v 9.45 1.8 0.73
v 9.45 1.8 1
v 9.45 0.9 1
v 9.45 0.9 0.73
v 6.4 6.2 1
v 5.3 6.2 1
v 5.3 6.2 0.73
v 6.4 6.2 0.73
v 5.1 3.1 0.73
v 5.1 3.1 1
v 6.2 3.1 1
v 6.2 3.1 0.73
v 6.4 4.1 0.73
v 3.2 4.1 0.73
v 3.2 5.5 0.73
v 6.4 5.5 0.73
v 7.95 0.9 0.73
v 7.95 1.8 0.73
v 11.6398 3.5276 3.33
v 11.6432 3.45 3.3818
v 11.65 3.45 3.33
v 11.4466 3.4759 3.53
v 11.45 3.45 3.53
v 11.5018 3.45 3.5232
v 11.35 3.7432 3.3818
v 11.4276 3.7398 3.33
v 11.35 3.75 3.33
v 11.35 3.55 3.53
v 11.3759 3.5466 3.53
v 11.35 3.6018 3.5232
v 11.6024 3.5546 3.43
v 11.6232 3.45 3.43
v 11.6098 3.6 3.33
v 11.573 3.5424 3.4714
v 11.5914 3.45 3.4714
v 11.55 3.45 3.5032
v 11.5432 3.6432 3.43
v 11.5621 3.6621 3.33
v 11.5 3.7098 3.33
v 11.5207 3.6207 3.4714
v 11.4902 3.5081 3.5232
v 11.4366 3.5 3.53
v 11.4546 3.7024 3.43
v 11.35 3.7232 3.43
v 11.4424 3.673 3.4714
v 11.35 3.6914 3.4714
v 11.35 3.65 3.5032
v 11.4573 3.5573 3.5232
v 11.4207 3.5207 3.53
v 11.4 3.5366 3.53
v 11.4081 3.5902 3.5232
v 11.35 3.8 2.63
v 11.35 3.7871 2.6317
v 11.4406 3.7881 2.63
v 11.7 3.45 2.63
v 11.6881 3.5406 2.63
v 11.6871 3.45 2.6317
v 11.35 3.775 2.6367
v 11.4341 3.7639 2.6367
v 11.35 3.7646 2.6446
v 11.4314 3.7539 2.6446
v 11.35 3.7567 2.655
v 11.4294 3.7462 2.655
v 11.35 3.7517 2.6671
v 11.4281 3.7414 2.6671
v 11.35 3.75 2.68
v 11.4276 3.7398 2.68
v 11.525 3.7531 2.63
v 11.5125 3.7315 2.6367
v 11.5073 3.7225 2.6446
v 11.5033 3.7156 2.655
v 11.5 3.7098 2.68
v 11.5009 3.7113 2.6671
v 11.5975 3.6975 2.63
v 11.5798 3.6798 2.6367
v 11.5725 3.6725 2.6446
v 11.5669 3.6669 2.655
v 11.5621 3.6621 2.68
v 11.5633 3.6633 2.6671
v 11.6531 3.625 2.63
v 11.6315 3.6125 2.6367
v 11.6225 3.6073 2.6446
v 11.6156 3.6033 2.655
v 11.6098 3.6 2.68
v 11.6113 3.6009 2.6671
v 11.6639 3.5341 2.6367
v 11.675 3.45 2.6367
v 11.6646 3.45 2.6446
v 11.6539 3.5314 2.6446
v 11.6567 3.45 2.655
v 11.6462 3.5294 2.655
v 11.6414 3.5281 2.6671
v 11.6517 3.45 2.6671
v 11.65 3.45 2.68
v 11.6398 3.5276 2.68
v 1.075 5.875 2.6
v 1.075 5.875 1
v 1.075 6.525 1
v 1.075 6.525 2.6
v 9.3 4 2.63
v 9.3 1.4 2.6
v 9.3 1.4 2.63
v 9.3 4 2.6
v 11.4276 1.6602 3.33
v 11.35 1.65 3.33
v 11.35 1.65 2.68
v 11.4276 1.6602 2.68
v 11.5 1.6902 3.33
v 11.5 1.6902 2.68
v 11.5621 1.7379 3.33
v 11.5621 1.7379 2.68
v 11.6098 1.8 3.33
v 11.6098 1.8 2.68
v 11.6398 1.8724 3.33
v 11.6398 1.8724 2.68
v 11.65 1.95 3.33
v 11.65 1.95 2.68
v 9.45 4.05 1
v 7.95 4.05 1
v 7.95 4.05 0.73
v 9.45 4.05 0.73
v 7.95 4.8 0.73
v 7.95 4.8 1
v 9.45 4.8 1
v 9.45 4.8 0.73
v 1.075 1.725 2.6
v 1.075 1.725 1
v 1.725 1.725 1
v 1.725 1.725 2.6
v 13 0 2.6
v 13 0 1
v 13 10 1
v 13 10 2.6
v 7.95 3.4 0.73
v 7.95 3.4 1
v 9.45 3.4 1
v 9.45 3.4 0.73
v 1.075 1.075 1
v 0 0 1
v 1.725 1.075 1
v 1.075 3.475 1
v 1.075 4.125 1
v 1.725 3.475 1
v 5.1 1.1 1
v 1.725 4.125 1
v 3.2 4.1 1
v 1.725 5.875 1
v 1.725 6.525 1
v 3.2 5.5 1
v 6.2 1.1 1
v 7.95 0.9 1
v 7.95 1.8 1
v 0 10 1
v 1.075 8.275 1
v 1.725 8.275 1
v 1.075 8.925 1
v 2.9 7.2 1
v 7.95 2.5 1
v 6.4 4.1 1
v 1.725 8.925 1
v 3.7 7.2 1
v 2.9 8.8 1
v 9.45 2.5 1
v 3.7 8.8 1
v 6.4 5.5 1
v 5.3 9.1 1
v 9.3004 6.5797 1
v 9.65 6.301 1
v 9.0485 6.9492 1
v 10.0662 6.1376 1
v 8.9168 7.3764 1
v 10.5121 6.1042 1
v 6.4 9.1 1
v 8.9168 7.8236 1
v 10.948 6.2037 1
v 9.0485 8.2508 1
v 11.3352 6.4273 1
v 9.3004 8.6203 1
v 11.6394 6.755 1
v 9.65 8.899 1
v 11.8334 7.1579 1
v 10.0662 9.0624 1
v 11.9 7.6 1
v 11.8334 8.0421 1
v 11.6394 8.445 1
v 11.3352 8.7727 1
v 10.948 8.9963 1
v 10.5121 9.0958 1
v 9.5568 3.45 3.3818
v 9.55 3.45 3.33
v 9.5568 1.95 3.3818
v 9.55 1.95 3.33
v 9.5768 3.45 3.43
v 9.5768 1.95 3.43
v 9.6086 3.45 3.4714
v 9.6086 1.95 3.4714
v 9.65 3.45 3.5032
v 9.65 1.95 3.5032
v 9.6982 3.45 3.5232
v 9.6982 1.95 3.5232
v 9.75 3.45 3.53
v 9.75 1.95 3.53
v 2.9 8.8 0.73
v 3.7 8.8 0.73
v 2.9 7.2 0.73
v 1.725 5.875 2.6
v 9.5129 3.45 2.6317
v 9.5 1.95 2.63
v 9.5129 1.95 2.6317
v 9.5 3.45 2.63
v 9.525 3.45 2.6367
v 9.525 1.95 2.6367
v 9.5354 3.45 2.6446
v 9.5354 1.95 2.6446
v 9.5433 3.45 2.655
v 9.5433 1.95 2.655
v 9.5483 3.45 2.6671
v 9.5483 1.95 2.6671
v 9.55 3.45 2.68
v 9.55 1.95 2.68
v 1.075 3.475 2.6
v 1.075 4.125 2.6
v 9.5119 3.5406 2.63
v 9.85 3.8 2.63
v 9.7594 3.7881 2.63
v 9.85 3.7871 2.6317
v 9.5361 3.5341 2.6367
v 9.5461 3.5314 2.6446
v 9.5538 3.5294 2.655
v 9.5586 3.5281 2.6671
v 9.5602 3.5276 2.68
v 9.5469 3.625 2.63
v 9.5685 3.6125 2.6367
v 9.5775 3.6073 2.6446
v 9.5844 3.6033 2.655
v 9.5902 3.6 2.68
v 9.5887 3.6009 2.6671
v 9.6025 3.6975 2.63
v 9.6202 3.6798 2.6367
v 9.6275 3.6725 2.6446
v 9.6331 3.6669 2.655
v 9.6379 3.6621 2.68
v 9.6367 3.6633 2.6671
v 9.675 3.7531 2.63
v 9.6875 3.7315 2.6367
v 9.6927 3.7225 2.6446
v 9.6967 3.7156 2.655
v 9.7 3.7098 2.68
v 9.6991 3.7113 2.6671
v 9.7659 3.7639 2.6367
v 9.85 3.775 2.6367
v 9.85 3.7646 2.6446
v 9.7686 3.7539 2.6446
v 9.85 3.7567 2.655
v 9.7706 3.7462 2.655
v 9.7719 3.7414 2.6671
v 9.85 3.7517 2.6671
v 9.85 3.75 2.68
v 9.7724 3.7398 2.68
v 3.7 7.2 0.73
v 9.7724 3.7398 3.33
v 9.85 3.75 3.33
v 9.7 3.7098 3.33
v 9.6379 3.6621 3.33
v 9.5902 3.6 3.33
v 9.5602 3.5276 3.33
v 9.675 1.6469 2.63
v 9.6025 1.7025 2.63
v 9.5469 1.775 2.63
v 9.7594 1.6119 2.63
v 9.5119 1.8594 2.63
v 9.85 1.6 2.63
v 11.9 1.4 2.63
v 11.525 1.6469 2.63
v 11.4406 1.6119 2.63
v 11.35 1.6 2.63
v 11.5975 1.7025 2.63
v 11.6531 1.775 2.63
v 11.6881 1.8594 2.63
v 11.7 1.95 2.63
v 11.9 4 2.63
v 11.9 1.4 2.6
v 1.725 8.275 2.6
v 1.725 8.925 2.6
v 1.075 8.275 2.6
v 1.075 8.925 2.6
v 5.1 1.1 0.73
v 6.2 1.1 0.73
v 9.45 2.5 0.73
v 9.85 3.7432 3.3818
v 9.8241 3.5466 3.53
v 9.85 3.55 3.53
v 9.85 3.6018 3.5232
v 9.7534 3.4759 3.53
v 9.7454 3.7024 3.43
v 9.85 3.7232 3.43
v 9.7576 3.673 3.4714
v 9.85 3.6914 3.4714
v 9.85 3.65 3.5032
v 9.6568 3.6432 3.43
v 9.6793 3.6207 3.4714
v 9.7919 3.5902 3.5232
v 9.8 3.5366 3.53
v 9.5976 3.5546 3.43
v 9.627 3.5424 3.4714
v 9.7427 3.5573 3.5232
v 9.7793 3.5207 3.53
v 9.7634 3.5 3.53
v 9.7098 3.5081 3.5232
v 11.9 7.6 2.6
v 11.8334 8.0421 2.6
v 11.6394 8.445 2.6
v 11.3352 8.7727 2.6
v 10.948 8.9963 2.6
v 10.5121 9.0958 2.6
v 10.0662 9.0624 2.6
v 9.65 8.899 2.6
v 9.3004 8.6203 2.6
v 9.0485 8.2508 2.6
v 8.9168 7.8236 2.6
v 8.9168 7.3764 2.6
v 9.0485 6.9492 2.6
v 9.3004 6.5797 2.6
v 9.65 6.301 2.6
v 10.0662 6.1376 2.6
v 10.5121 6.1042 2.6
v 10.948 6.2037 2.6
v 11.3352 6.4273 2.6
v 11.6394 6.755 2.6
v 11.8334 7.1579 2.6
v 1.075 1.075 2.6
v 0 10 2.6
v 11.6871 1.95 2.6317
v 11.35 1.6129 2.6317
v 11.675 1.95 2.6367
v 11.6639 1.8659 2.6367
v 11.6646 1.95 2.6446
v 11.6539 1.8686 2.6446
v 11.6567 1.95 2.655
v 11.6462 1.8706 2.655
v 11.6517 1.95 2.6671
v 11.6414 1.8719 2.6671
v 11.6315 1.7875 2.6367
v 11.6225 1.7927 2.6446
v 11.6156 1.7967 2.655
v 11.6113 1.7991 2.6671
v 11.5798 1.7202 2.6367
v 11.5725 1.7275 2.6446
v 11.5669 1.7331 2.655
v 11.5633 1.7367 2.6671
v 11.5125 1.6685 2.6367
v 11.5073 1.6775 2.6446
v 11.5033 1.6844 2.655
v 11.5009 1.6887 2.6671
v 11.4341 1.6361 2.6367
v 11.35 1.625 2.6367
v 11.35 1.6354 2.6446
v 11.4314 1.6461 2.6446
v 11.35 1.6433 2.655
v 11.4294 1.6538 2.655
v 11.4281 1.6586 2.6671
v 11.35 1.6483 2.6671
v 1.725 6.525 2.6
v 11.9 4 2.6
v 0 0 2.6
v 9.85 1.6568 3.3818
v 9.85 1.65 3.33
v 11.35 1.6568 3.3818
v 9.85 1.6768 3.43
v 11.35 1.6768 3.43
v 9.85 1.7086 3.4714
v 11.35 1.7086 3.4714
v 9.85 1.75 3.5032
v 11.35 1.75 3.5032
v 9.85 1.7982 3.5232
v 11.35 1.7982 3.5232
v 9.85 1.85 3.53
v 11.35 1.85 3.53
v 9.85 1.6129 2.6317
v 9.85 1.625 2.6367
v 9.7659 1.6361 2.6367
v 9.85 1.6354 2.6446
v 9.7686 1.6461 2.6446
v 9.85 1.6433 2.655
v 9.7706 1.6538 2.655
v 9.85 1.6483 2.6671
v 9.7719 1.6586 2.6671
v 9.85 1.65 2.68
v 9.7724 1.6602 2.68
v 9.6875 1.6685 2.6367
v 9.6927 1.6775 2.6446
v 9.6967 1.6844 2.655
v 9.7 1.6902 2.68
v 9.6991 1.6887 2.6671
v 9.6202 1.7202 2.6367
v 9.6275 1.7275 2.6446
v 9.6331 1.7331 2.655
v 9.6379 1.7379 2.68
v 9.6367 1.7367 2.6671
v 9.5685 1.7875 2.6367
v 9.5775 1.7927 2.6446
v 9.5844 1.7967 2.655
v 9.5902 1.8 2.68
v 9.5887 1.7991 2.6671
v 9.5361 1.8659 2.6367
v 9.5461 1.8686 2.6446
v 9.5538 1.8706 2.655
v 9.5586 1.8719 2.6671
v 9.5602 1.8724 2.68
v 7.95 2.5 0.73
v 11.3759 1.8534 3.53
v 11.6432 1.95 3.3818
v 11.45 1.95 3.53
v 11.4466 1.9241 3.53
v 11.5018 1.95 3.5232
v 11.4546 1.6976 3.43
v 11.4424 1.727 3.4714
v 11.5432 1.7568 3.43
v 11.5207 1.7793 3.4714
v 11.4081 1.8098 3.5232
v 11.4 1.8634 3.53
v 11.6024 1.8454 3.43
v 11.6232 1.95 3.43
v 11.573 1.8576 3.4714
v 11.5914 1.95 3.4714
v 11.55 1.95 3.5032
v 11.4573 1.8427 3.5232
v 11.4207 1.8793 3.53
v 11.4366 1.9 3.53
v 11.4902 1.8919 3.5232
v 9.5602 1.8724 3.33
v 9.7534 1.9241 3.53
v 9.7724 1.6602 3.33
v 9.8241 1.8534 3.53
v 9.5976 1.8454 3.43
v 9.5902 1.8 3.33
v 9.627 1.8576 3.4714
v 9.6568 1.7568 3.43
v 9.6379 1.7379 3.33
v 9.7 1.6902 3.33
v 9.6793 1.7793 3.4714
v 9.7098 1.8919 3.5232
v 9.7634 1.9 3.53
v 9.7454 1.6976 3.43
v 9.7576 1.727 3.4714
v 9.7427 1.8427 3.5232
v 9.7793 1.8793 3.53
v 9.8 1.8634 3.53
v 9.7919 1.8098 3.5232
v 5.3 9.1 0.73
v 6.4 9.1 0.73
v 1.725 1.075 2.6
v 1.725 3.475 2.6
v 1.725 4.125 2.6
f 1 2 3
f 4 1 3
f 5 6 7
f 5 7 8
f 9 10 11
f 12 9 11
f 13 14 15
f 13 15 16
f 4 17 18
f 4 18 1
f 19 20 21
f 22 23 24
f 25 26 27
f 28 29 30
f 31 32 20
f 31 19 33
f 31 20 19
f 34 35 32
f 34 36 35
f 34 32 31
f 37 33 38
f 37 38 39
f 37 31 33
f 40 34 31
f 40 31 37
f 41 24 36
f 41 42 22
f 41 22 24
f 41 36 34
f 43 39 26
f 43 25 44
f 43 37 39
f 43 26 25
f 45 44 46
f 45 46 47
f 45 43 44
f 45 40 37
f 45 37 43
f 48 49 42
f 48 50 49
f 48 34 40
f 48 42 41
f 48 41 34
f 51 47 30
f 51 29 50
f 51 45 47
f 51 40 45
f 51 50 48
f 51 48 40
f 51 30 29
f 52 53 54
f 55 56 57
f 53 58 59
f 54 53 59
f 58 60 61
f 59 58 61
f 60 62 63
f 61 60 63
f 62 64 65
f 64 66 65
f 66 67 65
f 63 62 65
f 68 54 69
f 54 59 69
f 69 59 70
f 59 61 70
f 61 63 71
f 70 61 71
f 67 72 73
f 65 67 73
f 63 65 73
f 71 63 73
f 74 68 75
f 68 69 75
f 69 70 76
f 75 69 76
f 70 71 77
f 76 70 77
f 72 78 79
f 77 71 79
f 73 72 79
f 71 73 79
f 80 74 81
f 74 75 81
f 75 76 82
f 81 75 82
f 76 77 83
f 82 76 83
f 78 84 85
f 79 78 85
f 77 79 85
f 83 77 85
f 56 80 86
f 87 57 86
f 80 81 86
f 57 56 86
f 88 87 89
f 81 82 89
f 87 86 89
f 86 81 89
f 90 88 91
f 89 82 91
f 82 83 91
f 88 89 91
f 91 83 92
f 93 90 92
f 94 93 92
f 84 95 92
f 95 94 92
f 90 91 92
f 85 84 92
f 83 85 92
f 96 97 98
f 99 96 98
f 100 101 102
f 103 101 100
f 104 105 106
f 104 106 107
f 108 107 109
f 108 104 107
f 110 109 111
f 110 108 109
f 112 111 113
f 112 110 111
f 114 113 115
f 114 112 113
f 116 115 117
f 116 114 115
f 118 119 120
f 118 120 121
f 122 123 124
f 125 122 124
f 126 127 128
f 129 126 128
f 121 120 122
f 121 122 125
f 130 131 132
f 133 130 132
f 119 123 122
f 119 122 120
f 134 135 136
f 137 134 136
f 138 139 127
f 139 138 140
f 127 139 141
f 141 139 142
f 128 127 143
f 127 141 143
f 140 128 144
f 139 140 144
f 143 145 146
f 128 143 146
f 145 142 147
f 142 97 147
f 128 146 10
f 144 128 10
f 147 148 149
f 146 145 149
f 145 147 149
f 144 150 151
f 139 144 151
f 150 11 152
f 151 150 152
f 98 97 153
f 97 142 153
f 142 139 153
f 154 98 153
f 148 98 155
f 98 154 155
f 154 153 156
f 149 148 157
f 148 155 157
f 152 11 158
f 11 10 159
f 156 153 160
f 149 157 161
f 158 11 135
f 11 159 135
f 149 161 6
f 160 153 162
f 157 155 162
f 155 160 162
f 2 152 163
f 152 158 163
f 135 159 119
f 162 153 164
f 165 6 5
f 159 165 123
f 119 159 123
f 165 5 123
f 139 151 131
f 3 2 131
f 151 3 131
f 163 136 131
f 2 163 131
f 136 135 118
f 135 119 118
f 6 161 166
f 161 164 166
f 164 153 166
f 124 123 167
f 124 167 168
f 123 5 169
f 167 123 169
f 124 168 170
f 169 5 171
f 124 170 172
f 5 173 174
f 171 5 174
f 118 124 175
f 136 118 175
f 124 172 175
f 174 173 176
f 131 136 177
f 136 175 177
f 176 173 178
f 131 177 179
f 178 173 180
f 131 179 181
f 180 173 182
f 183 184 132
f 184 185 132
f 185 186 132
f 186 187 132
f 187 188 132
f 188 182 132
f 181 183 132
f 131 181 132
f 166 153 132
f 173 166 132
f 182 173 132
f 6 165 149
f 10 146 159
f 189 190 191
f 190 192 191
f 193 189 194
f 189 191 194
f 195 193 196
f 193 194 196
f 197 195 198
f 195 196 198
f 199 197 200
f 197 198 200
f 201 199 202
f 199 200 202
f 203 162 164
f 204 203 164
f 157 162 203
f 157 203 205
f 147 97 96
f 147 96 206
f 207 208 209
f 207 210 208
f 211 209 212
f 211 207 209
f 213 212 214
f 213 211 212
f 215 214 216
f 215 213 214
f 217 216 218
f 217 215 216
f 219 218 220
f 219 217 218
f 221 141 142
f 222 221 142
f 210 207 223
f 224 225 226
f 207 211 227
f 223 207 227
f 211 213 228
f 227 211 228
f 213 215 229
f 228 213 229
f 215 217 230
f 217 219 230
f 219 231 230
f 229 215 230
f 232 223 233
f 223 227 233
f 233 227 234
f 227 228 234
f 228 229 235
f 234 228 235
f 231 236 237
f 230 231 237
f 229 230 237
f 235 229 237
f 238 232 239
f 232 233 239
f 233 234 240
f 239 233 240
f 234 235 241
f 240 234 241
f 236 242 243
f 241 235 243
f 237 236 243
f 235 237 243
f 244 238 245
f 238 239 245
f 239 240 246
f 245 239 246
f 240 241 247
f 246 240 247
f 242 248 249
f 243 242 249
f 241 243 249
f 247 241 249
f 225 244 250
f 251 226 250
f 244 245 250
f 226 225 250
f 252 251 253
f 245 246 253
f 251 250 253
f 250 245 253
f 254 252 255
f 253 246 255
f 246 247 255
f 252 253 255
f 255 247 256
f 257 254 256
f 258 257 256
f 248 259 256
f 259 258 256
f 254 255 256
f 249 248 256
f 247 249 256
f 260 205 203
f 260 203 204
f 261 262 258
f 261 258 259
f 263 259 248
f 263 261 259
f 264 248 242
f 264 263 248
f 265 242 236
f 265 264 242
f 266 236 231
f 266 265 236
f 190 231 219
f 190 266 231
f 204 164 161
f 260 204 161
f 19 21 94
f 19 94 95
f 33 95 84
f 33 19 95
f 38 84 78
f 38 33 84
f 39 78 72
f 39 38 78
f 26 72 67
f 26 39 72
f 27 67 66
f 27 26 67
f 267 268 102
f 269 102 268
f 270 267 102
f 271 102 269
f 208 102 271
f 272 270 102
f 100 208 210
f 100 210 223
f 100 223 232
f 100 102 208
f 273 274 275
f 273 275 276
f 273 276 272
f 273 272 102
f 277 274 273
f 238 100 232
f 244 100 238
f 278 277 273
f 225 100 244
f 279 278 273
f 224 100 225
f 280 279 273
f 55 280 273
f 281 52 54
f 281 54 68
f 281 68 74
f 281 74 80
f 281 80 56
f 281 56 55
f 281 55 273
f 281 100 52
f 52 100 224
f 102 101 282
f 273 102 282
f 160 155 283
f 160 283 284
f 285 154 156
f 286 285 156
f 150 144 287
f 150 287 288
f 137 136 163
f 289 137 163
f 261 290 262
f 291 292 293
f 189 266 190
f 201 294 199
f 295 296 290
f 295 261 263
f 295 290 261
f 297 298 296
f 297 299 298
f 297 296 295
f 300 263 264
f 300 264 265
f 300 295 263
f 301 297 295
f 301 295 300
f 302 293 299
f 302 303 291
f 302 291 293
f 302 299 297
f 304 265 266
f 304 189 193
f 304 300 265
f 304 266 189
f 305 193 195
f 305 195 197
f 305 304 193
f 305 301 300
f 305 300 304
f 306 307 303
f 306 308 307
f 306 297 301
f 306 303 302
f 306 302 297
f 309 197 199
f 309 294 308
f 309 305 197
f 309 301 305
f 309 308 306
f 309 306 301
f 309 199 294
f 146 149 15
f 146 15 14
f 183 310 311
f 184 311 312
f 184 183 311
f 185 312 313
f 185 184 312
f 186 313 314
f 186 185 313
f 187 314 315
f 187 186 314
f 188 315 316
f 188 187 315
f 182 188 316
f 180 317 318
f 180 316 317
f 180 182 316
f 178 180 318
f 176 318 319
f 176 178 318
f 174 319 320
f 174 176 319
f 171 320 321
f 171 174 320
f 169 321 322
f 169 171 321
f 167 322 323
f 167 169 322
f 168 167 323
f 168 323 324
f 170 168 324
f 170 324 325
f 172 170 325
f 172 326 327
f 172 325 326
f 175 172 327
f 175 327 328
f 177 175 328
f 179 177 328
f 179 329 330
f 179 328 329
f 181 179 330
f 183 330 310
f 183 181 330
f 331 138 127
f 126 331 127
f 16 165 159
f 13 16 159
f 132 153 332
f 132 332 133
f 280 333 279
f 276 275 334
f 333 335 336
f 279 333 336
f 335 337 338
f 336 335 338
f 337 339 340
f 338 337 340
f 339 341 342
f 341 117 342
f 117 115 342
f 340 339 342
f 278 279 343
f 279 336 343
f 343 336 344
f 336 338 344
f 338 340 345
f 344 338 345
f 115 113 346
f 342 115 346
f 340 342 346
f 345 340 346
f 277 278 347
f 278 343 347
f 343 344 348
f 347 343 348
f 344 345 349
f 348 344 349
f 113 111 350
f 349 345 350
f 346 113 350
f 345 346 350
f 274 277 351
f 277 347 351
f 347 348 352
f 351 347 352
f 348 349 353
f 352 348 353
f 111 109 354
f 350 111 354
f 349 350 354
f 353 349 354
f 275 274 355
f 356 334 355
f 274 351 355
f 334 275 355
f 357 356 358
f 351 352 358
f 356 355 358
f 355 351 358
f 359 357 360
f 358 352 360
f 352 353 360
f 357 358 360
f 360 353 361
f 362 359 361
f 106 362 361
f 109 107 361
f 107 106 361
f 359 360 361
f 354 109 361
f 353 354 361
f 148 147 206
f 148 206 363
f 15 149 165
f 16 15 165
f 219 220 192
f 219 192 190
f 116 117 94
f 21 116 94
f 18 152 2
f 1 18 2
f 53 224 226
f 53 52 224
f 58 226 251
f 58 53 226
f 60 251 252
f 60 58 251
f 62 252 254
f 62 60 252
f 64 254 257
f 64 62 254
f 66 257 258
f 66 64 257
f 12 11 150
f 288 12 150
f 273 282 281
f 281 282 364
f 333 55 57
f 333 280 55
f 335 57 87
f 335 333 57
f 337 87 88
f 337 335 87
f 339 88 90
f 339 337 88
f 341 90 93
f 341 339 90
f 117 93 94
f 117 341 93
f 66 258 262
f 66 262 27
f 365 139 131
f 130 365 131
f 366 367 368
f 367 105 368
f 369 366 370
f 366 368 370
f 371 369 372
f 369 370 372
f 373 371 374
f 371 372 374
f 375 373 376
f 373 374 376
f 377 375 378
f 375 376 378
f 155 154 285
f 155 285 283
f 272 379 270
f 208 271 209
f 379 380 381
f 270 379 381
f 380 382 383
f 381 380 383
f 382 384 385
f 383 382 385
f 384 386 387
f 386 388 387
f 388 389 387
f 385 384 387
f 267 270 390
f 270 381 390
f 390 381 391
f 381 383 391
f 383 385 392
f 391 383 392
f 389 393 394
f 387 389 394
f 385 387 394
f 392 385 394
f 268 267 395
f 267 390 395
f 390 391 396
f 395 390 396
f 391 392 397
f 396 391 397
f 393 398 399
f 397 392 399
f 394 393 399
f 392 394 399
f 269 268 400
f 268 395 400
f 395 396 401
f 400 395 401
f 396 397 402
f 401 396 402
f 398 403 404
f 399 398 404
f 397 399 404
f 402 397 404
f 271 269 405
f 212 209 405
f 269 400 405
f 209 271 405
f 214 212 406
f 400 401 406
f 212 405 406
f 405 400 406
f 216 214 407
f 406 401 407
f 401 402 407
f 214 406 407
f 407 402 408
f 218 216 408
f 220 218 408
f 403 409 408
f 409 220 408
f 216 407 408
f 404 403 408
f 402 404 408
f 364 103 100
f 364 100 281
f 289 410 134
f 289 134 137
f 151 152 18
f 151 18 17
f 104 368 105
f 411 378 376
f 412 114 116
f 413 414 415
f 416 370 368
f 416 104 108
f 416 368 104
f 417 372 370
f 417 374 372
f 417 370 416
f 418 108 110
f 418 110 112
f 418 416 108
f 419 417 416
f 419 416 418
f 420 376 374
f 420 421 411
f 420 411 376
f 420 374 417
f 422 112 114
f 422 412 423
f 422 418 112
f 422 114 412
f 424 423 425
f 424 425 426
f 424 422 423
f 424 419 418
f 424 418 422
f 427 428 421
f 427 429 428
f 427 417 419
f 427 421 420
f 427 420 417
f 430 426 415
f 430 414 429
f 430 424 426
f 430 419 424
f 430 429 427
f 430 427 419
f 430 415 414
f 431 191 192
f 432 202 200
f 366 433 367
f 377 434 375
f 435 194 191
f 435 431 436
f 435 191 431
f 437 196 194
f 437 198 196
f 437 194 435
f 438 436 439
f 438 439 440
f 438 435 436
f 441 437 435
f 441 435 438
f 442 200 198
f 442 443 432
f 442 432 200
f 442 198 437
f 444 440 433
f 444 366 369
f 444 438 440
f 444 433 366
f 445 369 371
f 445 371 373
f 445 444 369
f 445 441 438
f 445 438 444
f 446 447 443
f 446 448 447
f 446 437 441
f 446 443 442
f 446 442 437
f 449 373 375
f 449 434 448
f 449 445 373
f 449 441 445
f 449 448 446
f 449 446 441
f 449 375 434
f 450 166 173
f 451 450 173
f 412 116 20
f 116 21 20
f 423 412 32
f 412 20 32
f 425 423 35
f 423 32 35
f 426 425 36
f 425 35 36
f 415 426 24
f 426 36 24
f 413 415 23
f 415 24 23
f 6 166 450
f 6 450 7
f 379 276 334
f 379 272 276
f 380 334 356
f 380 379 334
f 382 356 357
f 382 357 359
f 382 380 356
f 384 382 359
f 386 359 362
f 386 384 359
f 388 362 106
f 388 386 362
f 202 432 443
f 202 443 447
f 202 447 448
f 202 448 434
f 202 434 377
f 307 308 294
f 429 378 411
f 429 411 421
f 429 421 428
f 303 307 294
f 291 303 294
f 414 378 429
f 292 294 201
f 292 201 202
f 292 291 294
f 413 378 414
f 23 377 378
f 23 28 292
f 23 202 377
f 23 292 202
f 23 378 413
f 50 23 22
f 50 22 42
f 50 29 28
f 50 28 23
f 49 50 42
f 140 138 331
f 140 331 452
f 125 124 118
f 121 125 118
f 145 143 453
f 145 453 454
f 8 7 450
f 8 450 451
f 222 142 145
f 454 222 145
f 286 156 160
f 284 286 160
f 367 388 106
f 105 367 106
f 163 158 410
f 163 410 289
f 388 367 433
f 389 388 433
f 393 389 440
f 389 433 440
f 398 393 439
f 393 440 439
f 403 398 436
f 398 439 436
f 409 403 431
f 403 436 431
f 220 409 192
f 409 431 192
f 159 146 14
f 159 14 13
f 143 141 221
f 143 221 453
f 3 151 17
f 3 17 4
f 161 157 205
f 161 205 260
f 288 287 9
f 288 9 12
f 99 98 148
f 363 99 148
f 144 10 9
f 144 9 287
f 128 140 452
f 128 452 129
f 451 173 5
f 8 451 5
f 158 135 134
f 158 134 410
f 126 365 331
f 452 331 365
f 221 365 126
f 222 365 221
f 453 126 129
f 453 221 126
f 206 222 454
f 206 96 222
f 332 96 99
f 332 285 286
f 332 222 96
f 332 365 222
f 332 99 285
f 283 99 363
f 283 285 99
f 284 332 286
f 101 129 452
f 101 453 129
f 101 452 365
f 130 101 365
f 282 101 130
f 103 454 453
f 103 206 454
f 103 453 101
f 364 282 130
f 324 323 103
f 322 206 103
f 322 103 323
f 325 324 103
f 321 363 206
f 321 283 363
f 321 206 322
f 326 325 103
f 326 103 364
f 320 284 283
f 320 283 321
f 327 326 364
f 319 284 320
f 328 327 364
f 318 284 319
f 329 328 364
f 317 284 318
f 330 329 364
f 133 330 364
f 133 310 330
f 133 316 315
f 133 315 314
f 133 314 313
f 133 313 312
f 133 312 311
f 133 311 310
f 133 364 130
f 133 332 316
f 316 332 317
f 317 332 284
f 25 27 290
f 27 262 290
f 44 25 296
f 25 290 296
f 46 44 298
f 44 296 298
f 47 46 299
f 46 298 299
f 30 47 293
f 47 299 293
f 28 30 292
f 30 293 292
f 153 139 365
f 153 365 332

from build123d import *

# Parameters (mm, degrees)
SKETCH_W      = 13
SKETCH_H      = 10
PAD_DEPTH     = 1.6
SKETCH001_R   = 1.5
SKETCH001_W   = 0.65
SKETCH001_H   = 0.65
POCKET_DEPTH  = 5
SKETCH002_W   = 2.6
SKETCH002_H   = 2.6
PAD001_DEPTH  = 0.03
SKETCH003_W   = 2.1
SKETCH003_H   = 2.1
PAD002_DEPTH  = 0.9
FILLET_R      = 0.3
FILLET001_R   = 0.05
FILLET002_R   = 0.2
SKETCH004_W   = 1.1
SKETCH004_H   = 2
SKETCH004_W_2 = 1.5
SKETCH004_H_2 = 0.9
SKETCH004_H_3 = 0.75
SKETCH004_H_4 = 2.9
SKETCH004_W_3 = 3.2
SKETCH004_H_5 = 1.4
SKETCH004_W_4 = 0.8
SKETCH004_H_6 = 1.6
PAD003_DEPTH  = 0.27


with BuildPart() as part:
    # Sketch → Pad (new body)
    with BuildSketch(Plane.XY):
        with Locations((6.5, 5)):
            Rectangle(SKETCH_W, SKETCH_H)
    extrude(amount=PAD_DEPTH)

    # Sketch001 → Pocket (cut)
    with BuildSketch(Plane.XY):
        with Locations((10.4, 7.6)):
            Circle(SKETCH001_R)
        with Locations((1.4, 8.6)):
            Rectangle(SKETCH001_W, SKETCH001_H)
        with Locations((1.4, 6.2)):
            Rectangle(SKETCH001_W, SKETCH001_H)
        with Locations((1.4, 3.8)):
            Rectangle(SKETCH001_W, SKETCH001_H)
        with Locations((1.4, 1.4)):
            Rectangle(SKETCH001_W, SKETCH001_H)
    extrude(amount=POCKET_DEPTH, mode=Mode.SUBTRACT)

    # Sketch002 (on Face5 of Pocket) → Pad001 (join)
    with BuildSketch(Plane.XY.offset(1.6)):
        with Locations((10.6, 2.7)):
            Rectangle(SKETCH002_W, SKETCH002_H)
    extrude(amount=PAD001_DEPTH)

    # Sketch003 (on Face28 of Pad001) → Pad002 (join)
    with BuildSketch(Plane.XY.offset(1.63)):
        with Locations((10.6, 2.7)):
            Rectangle(SKETCH003_W, SKETCH003_H)
    extrude(amount=PAD002_DEPTH)

    # Fillet
    fillet_edges = [part.edges().sort_by_distance(p)[0] for p in [
        (9.55, 1.65, 2.08),
        (9.55, 3.75, 2.08),
        (11.65, 1.65, 2.08),
        (11.65, 3.75, 2.08),
    ]]
    fillet(fillet_edges, radius=FILLET_R)

    # Fillet001
    fillet001_edges = [part.edges().sort_by_distance(p)[0] for p in [
        (9.637868, 1.737868, 1.63),
    ]]
    fillet(fillet001_edges, radius=FILLET001_R)

    # Fillet002
    fillet002_edges = [part.edges().sort_by_distance(p)[0] for p in [
        (10.6, 1.65, 2.53),
    ]]
    fillet(fillet002_edges, radius=FILLET002_R)

    # Sketch004 (on Face53 of Fillet002) → Pad003 (join)
    with BuildSketch(Plane(origin=(0, 0, 0), x_dir=(1, 0, 0), z_dir=(0, 0, -1))):
        with Locations((5.65, -2.1)):
            Rectangle(SKETCH004_W, SKETCH004_H)
        with Locations((8.7, -1.35)):
            Rectangle(SKETCH004_W_2, SKETCH004_H_2)
        with Locations((8.7, -2.95)):
            Rectangle(SKETCH004_W_2, SKETCH004_H_2)
        with Locations((8.7, -4.425)):
            Rectangle(SKETCH004_W_2, SKETCH004_H_3)
        with Locations((5.85, -7.65)):
            Rectangle(SKETCH004_W, SKETCH004_H_4)
        with Locations((4.8, -4.8)):
            Rectangle(SKETCH004_W_3, SKETCH004_H_5)
        with Locations((3.3, -8)):
            Rectangle(SKETCH004_W_4, SKETCH004_H_6)
    extrude(amount=PAD003_DEPTH)


with BuildPart() as part_1:
    # Body placement: moved
    add(part.part.moved(Location((0, 0, 1))))


solid = part_1.part
